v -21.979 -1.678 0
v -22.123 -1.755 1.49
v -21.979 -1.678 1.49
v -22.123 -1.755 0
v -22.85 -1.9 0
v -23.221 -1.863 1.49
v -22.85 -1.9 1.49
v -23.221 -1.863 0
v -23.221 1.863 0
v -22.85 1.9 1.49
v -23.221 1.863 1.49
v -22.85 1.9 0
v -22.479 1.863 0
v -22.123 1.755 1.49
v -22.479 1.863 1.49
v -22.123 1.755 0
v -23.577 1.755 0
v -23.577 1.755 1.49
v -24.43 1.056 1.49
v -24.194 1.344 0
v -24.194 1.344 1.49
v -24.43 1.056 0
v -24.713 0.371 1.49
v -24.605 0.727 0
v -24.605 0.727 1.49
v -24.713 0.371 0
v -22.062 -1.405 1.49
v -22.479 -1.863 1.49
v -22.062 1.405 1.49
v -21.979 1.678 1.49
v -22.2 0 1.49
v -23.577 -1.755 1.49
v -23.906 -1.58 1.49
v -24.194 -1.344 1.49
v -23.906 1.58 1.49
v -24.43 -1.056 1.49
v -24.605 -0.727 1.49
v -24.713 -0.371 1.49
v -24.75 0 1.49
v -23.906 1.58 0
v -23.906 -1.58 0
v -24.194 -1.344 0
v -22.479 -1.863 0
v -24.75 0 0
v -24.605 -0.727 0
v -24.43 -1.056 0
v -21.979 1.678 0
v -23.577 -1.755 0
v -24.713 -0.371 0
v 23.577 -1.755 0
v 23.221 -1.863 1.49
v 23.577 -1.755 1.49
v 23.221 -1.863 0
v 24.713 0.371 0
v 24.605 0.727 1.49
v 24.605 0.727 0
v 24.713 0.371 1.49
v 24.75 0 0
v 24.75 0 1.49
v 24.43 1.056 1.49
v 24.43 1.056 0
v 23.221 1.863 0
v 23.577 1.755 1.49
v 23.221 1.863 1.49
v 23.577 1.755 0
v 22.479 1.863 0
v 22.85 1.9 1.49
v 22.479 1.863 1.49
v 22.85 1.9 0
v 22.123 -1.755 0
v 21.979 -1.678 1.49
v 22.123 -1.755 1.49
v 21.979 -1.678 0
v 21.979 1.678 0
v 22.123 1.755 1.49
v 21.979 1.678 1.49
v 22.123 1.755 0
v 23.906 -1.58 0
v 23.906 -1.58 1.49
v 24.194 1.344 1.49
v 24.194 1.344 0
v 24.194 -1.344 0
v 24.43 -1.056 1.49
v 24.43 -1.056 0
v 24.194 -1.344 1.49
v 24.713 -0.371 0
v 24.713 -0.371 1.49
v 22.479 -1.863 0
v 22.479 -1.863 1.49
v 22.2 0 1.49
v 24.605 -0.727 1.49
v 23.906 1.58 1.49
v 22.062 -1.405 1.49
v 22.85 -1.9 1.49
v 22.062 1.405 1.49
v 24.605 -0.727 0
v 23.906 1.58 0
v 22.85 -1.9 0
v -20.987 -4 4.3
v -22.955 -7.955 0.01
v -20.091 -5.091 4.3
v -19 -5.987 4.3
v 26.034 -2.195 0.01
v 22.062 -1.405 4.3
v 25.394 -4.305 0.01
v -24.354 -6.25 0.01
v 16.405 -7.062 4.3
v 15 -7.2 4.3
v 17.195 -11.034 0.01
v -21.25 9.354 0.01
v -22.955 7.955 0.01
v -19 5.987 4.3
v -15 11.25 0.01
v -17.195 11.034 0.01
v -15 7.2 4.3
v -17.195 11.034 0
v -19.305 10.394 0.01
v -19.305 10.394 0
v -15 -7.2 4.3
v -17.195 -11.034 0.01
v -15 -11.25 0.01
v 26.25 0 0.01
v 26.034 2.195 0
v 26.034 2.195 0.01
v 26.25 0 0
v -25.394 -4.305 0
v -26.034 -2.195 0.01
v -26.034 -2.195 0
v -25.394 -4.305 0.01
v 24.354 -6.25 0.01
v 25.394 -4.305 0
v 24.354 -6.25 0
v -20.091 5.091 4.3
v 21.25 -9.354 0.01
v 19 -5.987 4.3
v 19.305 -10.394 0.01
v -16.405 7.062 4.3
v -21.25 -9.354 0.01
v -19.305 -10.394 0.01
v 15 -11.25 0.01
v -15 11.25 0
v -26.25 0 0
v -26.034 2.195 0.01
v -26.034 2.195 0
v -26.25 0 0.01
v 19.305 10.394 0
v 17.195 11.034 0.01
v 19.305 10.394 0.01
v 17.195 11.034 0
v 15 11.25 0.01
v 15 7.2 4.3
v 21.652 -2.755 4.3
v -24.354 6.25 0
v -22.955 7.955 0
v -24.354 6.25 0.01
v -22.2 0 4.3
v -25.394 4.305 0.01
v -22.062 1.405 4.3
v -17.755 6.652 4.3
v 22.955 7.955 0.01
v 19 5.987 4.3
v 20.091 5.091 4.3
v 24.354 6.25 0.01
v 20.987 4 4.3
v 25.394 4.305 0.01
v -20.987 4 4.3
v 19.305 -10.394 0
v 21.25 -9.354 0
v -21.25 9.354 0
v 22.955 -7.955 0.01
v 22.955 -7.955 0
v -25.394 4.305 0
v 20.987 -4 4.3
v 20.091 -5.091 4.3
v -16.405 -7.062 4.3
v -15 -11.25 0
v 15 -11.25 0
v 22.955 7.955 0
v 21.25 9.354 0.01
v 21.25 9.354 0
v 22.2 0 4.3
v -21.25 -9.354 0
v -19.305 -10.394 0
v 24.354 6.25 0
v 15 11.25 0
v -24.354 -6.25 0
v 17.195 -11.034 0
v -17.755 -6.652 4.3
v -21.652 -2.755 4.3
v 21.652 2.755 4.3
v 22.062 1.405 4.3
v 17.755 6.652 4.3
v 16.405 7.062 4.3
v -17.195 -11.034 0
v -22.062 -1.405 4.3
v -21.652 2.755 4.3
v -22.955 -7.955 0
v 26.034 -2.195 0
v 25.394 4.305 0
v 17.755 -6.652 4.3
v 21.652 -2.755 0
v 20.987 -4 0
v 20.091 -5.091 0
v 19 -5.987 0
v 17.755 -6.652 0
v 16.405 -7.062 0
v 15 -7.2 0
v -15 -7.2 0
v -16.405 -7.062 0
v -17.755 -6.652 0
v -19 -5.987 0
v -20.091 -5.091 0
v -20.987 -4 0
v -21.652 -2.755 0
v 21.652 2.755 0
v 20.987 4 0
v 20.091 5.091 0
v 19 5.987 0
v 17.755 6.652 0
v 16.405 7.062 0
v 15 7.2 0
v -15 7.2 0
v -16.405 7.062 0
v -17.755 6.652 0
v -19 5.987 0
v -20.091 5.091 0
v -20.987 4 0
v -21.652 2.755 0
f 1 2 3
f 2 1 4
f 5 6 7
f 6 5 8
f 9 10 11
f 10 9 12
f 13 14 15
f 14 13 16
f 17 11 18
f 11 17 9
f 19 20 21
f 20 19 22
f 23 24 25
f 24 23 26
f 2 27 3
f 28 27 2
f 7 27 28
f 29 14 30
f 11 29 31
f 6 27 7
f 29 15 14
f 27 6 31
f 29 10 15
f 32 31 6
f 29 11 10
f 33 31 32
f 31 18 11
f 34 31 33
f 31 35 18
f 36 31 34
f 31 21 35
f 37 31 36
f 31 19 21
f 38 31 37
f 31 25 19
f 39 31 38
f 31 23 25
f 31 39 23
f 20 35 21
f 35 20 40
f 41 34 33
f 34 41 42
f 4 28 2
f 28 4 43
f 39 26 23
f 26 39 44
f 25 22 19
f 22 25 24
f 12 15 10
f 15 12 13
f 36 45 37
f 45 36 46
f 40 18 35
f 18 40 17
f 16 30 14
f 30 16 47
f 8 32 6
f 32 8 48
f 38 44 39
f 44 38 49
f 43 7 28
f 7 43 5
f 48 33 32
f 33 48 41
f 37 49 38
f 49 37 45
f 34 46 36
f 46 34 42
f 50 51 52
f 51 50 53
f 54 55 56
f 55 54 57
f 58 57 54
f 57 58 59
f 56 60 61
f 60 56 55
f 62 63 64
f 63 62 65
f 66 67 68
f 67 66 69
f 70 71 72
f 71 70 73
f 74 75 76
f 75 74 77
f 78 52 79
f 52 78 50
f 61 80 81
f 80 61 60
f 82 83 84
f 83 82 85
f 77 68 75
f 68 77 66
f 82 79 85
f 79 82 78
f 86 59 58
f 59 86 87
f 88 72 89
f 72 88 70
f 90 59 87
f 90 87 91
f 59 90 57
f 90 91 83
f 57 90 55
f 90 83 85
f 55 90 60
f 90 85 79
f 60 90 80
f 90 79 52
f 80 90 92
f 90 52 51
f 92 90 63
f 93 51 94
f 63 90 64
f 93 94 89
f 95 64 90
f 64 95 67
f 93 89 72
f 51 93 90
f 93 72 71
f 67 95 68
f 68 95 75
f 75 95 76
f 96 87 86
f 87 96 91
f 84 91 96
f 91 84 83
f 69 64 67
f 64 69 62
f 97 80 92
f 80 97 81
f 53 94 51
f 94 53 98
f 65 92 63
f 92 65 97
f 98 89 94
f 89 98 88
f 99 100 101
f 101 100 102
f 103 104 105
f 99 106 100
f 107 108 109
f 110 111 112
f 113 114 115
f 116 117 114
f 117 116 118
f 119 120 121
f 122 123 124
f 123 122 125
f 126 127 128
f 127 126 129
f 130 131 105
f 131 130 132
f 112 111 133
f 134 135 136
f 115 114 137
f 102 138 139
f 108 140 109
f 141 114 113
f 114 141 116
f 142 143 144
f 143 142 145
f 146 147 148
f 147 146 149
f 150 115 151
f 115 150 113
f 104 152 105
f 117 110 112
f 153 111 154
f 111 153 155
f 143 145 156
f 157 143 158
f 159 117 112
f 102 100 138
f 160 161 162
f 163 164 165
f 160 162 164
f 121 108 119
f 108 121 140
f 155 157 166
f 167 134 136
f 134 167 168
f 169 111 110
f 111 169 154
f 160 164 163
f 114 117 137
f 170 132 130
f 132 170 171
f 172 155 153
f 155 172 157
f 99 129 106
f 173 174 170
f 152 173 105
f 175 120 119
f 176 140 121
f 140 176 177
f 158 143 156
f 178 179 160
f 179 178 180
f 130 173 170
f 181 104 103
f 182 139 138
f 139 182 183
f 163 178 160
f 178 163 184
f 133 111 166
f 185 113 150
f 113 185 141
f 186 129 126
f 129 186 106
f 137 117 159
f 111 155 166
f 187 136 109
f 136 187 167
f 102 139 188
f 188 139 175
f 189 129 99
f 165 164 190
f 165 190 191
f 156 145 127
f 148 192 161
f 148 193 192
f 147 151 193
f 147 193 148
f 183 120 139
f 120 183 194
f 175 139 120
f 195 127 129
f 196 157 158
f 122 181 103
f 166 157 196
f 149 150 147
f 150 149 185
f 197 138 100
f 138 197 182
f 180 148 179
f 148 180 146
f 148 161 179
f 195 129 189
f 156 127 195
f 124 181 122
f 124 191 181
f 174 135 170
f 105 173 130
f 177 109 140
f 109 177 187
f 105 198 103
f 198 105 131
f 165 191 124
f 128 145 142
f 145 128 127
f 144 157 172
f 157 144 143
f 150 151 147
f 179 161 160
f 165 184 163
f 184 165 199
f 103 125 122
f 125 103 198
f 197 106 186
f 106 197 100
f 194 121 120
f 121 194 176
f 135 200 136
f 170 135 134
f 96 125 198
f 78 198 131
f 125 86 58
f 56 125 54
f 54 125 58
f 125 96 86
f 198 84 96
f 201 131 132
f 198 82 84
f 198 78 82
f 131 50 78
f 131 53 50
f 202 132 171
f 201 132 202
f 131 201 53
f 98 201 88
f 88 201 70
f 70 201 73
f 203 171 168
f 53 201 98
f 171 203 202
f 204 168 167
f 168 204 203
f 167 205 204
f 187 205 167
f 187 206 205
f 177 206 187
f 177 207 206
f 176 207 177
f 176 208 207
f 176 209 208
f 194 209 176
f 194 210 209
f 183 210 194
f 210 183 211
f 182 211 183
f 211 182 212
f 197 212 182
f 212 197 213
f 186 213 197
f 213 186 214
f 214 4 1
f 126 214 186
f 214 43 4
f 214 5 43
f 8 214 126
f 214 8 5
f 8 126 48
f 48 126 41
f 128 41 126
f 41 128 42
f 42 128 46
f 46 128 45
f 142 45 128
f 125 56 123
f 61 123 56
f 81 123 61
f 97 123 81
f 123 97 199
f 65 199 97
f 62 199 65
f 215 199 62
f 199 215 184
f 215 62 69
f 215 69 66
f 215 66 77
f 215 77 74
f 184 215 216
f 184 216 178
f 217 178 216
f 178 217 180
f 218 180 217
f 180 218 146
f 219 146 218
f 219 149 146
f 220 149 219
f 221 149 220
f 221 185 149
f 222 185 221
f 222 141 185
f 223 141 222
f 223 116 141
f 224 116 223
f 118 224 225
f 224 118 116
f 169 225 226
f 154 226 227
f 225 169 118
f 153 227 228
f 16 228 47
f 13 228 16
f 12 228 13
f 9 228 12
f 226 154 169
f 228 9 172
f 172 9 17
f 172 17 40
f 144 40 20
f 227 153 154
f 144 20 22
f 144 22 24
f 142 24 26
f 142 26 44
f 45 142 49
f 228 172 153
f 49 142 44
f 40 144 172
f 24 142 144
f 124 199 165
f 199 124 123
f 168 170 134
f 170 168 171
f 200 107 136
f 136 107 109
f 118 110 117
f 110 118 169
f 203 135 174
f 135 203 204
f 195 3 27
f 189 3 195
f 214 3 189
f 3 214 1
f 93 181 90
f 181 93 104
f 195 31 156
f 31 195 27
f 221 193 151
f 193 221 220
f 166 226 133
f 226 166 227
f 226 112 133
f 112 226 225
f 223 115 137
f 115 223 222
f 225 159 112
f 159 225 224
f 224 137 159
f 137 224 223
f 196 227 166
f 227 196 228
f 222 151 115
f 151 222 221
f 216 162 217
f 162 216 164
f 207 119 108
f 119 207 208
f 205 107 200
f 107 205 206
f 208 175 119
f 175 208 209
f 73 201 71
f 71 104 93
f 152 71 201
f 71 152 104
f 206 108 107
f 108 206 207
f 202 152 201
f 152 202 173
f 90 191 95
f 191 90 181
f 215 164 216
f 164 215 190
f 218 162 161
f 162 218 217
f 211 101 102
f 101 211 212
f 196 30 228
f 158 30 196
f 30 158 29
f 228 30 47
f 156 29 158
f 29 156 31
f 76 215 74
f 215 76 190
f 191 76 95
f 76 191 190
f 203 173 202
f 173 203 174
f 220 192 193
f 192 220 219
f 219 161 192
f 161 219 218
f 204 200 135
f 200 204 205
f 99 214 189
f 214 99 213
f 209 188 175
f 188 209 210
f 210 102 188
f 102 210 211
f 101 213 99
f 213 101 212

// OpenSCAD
outerLength = 52.5;
buttonHoleWidth = 14.4;
buttonHoleLength = 44.4;
height = 4.3;
screwSpacing = 45.7;
screwHole = 3.8;
screwHoleDepth = 1.5;

module dummy() {}
nudge = 0.01;
outerWidth = outerLength-buttonHoleLength+buttonHoleWidth;

$fn = 32;

module oval(outerLength,outerWidth) {
    hull() {
        translate([-(outerLength-outerWidth)/2,0]) circle(d=outerWidth);
        translate([(outerLength-outerWidth)/2,0]) circle(d=outerWidth);
    }
}

difference() {
    hull() {
    linear_extrude(height=nudge) oval(outerLength,outerWidth);
    translate([0,0,height-nudge])
    linear_extrude(height=nudge) oval(buttonHoleLength,buttonHoleWidth);
    }
    translate([0,0,-nudge])
    linear_extrude(height=height+2*nudge) oval(buttonHoleLength,buttonHoleWidth);
    #for(x=[-screwSpacing/2,screwSpacing/2]) translate([x,0,-nudge])
    cylinder(h=screwHoleDepth,d=screwHole);
}
